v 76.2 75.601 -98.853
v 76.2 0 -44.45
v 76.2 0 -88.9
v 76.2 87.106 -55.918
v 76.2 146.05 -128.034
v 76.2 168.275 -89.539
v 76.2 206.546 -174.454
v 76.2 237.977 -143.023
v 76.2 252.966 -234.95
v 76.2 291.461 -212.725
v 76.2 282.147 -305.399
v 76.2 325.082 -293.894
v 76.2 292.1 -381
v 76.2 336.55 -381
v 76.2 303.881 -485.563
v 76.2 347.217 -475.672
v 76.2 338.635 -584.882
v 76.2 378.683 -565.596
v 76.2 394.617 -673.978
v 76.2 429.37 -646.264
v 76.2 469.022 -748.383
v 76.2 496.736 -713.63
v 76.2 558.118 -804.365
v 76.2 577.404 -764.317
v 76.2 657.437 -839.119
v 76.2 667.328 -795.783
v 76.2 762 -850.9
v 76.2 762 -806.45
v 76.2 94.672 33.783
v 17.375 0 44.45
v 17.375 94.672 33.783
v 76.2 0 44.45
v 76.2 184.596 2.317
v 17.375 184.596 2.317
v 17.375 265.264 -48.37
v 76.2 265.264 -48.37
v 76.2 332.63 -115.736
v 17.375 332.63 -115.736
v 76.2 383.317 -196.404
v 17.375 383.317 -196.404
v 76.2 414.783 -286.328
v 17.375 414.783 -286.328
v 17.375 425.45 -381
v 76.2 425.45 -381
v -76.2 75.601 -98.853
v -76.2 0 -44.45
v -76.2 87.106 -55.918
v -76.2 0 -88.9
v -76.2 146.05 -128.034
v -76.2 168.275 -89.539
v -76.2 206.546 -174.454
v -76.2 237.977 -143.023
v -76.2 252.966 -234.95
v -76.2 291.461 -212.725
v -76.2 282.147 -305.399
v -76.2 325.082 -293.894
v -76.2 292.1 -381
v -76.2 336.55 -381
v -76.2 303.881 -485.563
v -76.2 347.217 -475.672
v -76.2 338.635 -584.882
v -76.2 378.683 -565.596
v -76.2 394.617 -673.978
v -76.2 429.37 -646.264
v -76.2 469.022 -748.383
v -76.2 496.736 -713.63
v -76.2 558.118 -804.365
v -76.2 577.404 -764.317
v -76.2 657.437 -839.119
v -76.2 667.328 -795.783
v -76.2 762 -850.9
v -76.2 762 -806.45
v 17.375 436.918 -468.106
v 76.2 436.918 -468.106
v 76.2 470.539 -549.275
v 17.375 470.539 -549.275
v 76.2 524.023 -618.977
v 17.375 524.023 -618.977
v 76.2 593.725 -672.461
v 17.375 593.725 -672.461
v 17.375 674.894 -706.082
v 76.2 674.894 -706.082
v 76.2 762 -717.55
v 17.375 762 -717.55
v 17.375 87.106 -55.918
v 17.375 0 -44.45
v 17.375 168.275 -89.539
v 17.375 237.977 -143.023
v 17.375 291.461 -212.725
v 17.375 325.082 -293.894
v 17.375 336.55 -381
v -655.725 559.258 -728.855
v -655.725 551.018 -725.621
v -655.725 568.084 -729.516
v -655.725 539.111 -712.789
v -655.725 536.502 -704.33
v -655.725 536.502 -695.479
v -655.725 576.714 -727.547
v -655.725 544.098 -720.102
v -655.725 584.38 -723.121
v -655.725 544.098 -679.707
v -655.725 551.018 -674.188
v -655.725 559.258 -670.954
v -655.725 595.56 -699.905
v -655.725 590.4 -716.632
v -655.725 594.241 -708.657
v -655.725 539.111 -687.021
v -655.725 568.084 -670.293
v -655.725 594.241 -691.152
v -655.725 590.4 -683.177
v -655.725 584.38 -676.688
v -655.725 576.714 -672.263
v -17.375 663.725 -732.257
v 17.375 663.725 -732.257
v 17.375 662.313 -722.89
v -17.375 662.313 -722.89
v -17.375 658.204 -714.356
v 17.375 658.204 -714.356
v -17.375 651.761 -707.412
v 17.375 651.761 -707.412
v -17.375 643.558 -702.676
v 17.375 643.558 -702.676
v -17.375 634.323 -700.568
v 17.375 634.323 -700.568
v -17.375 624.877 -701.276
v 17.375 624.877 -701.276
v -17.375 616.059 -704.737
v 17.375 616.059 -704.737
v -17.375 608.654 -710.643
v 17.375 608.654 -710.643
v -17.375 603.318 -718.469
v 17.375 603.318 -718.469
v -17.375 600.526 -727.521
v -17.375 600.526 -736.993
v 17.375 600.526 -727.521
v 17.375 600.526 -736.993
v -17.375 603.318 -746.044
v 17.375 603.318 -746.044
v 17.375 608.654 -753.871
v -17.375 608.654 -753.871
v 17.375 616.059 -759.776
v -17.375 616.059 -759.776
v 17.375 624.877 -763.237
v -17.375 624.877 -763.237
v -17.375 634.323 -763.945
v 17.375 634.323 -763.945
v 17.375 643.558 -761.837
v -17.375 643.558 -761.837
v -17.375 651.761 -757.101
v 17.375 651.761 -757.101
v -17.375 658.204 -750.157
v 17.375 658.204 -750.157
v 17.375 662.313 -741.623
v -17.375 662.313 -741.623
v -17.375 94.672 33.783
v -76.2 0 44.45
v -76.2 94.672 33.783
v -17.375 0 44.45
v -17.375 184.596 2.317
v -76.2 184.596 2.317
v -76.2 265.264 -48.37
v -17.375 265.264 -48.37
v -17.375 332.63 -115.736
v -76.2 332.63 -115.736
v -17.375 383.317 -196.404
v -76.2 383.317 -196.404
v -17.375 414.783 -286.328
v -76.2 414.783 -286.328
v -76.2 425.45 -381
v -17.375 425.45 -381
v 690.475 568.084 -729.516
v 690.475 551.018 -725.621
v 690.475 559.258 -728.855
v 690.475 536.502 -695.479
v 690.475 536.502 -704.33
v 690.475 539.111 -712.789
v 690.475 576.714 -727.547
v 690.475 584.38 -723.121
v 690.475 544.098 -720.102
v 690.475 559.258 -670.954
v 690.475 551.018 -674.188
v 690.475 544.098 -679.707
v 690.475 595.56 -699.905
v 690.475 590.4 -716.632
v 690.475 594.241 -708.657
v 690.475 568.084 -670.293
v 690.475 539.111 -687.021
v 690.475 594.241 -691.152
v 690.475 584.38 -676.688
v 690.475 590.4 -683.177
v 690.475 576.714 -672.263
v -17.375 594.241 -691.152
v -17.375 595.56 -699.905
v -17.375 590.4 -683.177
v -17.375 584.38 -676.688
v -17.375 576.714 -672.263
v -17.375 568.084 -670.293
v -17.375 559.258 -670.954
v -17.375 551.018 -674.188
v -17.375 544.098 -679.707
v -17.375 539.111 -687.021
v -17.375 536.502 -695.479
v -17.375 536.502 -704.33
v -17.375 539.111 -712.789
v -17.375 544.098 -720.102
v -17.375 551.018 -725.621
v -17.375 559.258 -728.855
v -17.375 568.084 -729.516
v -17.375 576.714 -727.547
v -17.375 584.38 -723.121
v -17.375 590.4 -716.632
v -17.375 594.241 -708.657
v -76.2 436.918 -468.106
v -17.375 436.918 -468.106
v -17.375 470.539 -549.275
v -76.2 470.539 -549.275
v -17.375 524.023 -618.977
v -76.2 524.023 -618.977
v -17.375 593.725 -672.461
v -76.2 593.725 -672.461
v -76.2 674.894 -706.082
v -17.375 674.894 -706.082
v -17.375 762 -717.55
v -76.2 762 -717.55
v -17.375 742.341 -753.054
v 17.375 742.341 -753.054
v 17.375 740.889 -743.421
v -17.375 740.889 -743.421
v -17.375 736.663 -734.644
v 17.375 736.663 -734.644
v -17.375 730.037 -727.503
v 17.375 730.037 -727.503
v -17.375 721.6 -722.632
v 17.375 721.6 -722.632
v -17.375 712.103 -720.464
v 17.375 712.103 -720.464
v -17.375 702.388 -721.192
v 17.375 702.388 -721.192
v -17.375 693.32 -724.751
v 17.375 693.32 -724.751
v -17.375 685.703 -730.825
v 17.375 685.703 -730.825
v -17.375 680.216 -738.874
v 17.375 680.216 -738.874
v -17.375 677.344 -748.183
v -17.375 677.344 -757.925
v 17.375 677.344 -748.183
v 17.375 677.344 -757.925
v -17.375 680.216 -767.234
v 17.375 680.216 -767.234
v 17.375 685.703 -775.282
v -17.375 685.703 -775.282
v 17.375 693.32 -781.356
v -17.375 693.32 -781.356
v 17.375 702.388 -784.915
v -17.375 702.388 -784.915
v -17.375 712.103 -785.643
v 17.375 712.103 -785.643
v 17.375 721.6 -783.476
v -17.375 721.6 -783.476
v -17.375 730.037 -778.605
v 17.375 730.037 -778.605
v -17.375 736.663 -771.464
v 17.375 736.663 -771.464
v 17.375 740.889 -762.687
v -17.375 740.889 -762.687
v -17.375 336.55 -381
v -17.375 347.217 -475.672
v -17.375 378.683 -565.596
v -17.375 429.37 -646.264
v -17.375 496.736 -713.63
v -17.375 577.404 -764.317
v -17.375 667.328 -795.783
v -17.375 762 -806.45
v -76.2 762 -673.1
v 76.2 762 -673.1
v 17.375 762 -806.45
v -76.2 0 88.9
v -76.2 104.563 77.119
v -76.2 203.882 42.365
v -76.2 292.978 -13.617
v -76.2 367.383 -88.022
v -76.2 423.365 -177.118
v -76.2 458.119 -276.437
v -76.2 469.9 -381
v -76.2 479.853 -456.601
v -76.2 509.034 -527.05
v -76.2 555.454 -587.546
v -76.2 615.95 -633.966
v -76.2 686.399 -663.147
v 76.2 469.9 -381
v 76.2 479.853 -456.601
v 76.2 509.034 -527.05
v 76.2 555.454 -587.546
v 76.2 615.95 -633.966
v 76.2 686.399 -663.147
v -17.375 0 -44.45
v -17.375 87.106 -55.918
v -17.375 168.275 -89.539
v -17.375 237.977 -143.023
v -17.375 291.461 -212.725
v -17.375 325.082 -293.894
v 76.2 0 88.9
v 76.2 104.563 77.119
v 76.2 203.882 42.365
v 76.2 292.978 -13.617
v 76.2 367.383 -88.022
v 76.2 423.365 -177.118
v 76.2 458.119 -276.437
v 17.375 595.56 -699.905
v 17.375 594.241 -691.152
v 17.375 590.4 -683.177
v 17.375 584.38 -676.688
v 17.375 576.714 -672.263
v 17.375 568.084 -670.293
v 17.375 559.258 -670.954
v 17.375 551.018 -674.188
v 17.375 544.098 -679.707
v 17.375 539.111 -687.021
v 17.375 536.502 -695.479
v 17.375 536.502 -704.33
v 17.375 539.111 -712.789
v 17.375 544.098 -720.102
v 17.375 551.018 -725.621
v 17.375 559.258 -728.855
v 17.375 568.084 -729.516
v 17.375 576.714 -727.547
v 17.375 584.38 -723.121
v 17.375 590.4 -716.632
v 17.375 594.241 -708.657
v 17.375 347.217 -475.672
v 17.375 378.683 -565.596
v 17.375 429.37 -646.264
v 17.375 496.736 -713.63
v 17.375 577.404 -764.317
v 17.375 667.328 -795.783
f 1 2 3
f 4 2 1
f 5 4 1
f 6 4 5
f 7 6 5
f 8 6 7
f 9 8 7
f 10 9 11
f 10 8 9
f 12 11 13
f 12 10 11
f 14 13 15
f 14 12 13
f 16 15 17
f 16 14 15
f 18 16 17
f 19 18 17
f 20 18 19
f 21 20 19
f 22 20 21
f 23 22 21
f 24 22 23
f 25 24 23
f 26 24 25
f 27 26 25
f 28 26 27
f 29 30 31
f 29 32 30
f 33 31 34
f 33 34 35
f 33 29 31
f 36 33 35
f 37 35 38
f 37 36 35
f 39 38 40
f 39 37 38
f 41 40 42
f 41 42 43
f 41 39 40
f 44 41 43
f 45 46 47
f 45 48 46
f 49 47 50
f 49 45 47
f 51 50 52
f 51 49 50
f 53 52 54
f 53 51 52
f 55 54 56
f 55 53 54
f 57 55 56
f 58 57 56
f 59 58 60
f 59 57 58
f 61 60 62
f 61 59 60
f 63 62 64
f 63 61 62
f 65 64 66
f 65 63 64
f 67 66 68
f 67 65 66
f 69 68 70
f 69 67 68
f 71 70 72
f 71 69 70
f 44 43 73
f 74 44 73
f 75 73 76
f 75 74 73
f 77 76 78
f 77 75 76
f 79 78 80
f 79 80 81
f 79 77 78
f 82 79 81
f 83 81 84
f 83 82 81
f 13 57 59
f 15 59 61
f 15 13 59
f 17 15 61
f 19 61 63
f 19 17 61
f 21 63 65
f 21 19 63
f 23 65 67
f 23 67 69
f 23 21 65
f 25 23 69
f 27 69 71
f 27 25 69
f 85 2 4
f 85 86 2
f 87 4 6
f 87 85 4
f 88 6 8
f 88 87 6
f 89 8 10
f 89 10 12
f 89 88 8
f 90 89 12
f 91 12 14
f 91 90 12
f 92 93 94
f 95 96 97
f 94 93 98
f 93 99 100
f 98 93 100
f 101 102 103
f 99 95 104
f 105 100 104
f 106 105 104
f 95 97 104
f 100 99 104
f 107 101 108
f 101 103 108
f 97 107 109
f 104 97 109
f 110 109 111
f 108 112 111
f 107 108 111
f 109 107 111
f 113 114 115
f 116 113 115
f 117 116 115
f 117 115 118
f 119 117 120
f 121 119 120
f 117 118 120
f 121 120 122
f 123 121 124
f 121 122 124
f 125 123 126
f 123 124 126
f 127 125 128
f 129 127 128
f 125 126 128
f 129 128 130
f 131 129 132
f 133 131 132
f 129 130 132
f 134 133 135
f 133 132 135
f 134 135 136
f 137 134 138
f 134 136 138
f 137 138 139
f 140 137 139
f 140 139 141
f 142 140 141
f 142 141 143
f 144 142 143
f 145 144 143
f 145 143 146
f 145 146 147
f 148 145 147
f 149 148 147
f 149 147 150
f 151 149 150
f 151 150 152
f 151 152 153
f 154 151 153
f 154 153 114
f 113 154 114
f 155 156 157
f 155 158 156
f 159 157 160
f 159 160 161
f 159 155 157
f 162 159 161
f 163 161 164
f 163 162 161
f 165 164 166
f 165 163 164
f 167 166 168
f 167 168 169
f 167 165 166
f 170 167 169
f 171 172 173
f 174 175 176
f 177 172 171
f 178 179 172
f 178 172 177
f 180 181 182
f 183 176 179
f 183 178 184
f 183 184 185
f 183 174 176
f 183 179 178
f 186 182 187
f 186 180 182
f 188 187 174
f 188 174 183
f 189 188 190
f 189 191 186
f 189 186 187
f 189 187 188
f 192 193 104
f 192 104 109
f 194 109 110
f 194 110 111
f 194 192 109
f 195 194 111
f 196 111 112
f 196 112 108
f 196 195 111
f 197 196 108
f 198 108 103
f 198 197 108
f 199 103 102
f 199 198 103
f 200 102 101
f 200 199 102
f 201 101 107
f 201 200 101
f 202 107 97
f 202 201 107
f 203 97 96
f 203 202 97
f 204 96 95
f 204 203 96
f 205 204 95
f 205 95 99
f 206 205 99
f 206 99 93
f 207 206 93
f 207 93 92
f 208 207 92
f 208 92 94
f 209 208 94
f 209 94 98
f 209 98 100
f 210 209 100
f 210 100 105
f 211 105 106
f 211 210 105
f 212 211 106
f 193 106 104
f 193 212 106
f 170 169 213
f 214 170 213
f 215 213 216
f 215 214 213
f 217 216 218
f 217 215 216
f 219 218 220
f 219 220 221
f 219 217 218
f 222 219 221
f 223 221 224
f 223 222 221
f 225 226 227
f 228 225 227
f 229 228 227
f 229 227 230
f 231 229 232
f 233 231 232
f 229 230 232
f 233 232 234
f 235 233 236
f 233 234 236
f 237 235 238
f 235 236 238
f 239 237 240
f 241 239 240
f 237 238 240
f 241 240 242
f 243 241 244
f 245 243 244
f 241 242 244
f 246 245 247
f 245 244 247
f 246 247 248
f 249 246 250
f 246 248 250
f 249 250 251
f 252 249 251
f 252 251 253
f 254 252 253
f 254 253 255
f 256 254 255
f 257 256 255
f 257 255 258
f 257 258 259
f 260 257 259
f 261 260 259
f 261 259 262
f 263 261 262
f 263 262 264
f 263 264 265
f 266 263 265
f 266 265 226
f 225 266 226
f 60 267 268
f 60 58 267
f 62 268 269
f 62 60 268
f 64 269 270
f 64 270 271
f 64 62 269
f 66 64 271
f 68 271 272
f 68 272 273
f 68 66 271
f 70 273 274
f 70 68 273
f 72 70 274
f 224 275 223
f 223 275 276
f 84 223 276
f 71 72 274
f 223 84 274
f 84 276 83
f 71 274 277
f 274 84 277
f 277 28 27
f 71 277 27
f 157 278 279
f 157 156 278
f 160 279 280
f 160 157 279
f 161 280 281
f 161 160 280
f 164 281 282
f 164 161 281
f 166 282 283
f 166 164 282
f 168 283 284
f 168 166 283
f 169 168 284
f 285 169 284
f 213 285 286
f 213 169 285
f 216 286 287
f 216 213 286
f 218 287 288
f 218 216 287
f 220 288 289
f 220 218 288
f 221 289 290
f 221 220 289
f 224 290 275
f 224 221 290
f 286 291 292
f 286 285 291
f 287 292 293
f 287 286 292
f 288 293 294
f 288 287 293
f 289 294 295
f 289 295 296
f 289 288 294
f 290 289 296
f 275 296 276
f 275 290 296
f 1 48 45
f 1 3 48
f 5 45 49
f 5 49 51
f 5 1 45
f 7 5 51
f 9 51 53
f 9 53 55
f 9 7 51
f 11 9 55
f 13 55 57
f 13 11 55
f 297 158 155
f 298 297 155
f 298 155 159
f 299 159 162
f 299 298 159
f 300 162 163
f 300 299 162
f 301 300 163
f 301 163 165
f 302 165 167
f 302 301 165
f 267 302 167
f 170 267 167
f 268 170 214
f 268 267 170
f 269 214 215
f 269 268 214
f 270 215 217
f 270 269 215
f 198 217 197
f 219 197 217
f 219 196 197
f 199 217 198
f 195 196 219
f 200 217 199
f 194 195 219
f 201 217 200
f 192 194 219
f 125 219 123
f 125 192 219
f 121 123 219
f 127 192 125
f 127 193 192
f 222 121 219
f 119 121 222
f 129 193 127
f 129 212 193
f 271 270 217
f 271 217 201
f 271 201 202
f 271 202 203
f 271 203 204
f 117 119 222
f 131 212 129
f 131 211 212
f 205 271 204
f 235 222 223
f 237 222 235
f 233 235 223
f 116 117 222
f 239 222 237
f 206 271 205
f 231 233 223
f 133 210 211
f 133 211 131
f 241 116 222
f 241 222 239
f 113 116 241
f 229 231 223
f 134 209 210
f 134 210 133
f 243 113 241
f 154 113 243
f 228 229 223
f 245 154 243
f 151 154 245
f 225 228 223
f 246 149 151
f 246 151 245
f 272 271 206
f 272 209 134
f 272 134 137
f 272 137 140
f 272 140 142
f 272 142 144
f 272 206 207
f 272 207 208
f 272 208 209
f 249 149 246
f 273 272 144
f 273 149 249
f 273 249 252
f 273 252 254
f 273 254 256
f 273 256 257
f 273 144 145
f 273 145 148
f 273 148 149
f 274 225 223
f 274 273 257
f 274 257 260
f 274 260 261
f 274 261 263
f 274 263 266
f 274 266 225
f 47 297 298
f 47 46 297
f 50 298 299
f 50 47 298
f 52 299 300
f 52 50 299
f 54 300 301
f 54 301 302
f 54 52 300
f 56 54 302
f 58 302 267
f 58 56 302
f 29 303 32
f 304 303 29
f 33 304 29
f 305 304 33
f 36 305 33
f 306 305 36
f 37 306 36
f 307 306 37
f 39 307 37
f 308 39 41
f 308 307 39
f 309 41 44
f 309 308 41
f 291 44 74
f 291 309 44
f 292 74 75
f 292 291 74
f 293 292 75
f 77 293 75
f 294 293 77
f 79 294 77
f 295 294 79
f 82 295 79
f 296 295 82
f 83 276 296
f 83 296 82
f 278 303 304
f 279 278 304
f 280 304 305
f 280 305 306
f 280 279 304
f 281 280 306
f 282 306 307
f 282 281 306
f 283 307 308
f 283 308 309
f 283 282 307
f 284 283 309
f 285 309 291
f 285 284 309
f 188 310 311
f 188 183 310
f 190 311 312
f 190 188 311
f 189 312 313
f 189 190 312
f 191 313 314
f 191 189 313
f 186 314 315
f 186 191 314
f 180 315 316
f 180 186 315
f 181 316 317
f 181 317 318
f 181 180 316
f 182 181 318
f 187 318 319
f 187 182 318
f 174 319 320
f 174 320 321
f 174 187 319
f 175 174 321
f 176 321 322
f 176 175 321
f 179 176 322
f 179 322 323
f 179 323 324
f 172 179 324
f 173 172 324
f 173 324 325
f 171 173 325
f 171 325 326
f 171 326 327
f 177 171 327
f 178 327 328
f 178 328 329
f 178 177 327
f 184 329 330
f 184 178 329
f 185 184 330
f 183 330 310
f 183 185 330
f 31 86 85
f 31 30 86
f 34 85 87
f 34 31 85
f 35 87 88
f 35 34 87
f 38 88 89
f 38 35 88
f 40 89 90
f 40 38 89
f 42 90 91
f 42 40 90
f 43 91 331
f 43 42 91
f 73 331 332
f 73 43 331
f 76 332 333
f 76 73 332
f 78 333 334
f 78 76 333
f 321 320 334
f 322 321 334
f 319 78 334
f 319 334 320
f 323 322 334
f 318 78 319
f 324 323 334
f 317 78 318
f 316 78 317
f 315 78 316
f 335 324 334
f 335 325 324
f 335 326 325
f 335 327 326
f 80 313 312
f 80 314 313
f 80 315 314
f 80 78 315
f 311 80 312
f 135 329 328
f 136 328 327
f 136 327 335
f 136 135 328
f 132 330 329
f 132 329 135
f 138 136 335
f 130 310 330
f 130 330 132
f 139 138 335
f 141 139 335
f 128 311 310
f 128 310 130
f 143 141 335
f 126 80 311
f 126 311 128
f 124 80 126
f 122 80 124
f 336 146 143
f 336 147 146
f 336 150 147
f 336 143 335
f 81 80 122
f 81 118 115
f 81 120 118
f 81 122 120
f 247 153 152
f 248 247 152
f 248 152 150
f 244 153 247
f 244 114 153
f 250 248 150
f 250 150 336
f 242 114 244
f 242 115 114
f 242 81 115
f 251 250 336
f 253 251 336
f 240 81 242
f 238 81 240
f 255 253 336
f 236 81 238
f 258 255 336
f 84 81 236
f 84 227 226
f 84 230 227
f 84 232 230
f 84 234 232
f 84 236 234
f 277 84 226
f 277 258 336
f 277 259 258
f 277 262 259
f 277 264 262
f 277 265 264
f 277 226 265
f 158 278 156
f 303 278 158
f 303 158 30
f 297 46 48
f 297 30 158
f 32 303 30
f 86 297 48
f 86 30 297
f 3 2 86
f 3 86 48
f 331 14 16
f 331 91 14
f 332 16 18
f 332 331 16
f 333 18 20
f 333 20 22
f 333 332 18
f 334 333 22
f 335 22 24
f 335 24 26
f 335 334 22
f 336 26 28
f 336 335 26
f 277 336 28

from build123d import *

# Parameters (mm, degrees)
F3_R     = 29.6946462183
F4_DEPTH = 673.1
F5_R     = 31.777125294
F5_R_2   = 32.6810684337
F6_DEPTH = 673.101


# Not quite as in the source:
# - a feature of the source that left no trace in its solid (it failed there, or was rolled back) is left out


with BuildPart() as f2:
    # F2: sweep along a path in F1
    with BuildLine(Plane.YZ) as f2_path:
        ThreePointArc((0, 0), (269.4076836321, -111.5923163679), (381, -381))
        ThreePointArc((381, -381), (492.5923163679, -650.4076836321), (762, -762))
    # F0 (on Front) → F2 (sweep)
    with BuildSketch(Plane.XZ):
        Polygon((76.2, 88.9), (0, 88.9), (-76.2, 88.9), (-76.2, 44.45), (-17.3748321831, 44.45), (-17.3748321831, 0), (-17.3748321831, -44.45), (-76.2, -44.45), (-76.2, -88.9), (0, -88.9), (76.2, -88.9), (76.2, -44.45), (17.3748321831, -44.45), (17.3748321831, 0), (17.3748321831, 44.45), (76.2, 44.45), align=None)
    sweep(path=f2_path.line)

    # F3 (on face) → F4 (join, symmetric)
    with BuildSketch(Plane.YZ.offset(17.3748321831)):
        with Locations((565.865278244, -699.9046206474)):
            Circle(F3_R)
    extrude(amount=F4_DEPTH, both=True)

    # F5 (on face) → F6 (cut, through all)
    with BuildSketch(Plane.YZ.offset(17.3748321831)):
        with Locations((631.9480538368, -732.2566509247)):
            Circle(F5_R)
        with Locations((709.6602916718, -753.0537247658)):
            Circle(F5_R_2)
    extrude(amount=-F6_DEPTH, mode=Mode.SUBTRACT)


solid = f2.part
